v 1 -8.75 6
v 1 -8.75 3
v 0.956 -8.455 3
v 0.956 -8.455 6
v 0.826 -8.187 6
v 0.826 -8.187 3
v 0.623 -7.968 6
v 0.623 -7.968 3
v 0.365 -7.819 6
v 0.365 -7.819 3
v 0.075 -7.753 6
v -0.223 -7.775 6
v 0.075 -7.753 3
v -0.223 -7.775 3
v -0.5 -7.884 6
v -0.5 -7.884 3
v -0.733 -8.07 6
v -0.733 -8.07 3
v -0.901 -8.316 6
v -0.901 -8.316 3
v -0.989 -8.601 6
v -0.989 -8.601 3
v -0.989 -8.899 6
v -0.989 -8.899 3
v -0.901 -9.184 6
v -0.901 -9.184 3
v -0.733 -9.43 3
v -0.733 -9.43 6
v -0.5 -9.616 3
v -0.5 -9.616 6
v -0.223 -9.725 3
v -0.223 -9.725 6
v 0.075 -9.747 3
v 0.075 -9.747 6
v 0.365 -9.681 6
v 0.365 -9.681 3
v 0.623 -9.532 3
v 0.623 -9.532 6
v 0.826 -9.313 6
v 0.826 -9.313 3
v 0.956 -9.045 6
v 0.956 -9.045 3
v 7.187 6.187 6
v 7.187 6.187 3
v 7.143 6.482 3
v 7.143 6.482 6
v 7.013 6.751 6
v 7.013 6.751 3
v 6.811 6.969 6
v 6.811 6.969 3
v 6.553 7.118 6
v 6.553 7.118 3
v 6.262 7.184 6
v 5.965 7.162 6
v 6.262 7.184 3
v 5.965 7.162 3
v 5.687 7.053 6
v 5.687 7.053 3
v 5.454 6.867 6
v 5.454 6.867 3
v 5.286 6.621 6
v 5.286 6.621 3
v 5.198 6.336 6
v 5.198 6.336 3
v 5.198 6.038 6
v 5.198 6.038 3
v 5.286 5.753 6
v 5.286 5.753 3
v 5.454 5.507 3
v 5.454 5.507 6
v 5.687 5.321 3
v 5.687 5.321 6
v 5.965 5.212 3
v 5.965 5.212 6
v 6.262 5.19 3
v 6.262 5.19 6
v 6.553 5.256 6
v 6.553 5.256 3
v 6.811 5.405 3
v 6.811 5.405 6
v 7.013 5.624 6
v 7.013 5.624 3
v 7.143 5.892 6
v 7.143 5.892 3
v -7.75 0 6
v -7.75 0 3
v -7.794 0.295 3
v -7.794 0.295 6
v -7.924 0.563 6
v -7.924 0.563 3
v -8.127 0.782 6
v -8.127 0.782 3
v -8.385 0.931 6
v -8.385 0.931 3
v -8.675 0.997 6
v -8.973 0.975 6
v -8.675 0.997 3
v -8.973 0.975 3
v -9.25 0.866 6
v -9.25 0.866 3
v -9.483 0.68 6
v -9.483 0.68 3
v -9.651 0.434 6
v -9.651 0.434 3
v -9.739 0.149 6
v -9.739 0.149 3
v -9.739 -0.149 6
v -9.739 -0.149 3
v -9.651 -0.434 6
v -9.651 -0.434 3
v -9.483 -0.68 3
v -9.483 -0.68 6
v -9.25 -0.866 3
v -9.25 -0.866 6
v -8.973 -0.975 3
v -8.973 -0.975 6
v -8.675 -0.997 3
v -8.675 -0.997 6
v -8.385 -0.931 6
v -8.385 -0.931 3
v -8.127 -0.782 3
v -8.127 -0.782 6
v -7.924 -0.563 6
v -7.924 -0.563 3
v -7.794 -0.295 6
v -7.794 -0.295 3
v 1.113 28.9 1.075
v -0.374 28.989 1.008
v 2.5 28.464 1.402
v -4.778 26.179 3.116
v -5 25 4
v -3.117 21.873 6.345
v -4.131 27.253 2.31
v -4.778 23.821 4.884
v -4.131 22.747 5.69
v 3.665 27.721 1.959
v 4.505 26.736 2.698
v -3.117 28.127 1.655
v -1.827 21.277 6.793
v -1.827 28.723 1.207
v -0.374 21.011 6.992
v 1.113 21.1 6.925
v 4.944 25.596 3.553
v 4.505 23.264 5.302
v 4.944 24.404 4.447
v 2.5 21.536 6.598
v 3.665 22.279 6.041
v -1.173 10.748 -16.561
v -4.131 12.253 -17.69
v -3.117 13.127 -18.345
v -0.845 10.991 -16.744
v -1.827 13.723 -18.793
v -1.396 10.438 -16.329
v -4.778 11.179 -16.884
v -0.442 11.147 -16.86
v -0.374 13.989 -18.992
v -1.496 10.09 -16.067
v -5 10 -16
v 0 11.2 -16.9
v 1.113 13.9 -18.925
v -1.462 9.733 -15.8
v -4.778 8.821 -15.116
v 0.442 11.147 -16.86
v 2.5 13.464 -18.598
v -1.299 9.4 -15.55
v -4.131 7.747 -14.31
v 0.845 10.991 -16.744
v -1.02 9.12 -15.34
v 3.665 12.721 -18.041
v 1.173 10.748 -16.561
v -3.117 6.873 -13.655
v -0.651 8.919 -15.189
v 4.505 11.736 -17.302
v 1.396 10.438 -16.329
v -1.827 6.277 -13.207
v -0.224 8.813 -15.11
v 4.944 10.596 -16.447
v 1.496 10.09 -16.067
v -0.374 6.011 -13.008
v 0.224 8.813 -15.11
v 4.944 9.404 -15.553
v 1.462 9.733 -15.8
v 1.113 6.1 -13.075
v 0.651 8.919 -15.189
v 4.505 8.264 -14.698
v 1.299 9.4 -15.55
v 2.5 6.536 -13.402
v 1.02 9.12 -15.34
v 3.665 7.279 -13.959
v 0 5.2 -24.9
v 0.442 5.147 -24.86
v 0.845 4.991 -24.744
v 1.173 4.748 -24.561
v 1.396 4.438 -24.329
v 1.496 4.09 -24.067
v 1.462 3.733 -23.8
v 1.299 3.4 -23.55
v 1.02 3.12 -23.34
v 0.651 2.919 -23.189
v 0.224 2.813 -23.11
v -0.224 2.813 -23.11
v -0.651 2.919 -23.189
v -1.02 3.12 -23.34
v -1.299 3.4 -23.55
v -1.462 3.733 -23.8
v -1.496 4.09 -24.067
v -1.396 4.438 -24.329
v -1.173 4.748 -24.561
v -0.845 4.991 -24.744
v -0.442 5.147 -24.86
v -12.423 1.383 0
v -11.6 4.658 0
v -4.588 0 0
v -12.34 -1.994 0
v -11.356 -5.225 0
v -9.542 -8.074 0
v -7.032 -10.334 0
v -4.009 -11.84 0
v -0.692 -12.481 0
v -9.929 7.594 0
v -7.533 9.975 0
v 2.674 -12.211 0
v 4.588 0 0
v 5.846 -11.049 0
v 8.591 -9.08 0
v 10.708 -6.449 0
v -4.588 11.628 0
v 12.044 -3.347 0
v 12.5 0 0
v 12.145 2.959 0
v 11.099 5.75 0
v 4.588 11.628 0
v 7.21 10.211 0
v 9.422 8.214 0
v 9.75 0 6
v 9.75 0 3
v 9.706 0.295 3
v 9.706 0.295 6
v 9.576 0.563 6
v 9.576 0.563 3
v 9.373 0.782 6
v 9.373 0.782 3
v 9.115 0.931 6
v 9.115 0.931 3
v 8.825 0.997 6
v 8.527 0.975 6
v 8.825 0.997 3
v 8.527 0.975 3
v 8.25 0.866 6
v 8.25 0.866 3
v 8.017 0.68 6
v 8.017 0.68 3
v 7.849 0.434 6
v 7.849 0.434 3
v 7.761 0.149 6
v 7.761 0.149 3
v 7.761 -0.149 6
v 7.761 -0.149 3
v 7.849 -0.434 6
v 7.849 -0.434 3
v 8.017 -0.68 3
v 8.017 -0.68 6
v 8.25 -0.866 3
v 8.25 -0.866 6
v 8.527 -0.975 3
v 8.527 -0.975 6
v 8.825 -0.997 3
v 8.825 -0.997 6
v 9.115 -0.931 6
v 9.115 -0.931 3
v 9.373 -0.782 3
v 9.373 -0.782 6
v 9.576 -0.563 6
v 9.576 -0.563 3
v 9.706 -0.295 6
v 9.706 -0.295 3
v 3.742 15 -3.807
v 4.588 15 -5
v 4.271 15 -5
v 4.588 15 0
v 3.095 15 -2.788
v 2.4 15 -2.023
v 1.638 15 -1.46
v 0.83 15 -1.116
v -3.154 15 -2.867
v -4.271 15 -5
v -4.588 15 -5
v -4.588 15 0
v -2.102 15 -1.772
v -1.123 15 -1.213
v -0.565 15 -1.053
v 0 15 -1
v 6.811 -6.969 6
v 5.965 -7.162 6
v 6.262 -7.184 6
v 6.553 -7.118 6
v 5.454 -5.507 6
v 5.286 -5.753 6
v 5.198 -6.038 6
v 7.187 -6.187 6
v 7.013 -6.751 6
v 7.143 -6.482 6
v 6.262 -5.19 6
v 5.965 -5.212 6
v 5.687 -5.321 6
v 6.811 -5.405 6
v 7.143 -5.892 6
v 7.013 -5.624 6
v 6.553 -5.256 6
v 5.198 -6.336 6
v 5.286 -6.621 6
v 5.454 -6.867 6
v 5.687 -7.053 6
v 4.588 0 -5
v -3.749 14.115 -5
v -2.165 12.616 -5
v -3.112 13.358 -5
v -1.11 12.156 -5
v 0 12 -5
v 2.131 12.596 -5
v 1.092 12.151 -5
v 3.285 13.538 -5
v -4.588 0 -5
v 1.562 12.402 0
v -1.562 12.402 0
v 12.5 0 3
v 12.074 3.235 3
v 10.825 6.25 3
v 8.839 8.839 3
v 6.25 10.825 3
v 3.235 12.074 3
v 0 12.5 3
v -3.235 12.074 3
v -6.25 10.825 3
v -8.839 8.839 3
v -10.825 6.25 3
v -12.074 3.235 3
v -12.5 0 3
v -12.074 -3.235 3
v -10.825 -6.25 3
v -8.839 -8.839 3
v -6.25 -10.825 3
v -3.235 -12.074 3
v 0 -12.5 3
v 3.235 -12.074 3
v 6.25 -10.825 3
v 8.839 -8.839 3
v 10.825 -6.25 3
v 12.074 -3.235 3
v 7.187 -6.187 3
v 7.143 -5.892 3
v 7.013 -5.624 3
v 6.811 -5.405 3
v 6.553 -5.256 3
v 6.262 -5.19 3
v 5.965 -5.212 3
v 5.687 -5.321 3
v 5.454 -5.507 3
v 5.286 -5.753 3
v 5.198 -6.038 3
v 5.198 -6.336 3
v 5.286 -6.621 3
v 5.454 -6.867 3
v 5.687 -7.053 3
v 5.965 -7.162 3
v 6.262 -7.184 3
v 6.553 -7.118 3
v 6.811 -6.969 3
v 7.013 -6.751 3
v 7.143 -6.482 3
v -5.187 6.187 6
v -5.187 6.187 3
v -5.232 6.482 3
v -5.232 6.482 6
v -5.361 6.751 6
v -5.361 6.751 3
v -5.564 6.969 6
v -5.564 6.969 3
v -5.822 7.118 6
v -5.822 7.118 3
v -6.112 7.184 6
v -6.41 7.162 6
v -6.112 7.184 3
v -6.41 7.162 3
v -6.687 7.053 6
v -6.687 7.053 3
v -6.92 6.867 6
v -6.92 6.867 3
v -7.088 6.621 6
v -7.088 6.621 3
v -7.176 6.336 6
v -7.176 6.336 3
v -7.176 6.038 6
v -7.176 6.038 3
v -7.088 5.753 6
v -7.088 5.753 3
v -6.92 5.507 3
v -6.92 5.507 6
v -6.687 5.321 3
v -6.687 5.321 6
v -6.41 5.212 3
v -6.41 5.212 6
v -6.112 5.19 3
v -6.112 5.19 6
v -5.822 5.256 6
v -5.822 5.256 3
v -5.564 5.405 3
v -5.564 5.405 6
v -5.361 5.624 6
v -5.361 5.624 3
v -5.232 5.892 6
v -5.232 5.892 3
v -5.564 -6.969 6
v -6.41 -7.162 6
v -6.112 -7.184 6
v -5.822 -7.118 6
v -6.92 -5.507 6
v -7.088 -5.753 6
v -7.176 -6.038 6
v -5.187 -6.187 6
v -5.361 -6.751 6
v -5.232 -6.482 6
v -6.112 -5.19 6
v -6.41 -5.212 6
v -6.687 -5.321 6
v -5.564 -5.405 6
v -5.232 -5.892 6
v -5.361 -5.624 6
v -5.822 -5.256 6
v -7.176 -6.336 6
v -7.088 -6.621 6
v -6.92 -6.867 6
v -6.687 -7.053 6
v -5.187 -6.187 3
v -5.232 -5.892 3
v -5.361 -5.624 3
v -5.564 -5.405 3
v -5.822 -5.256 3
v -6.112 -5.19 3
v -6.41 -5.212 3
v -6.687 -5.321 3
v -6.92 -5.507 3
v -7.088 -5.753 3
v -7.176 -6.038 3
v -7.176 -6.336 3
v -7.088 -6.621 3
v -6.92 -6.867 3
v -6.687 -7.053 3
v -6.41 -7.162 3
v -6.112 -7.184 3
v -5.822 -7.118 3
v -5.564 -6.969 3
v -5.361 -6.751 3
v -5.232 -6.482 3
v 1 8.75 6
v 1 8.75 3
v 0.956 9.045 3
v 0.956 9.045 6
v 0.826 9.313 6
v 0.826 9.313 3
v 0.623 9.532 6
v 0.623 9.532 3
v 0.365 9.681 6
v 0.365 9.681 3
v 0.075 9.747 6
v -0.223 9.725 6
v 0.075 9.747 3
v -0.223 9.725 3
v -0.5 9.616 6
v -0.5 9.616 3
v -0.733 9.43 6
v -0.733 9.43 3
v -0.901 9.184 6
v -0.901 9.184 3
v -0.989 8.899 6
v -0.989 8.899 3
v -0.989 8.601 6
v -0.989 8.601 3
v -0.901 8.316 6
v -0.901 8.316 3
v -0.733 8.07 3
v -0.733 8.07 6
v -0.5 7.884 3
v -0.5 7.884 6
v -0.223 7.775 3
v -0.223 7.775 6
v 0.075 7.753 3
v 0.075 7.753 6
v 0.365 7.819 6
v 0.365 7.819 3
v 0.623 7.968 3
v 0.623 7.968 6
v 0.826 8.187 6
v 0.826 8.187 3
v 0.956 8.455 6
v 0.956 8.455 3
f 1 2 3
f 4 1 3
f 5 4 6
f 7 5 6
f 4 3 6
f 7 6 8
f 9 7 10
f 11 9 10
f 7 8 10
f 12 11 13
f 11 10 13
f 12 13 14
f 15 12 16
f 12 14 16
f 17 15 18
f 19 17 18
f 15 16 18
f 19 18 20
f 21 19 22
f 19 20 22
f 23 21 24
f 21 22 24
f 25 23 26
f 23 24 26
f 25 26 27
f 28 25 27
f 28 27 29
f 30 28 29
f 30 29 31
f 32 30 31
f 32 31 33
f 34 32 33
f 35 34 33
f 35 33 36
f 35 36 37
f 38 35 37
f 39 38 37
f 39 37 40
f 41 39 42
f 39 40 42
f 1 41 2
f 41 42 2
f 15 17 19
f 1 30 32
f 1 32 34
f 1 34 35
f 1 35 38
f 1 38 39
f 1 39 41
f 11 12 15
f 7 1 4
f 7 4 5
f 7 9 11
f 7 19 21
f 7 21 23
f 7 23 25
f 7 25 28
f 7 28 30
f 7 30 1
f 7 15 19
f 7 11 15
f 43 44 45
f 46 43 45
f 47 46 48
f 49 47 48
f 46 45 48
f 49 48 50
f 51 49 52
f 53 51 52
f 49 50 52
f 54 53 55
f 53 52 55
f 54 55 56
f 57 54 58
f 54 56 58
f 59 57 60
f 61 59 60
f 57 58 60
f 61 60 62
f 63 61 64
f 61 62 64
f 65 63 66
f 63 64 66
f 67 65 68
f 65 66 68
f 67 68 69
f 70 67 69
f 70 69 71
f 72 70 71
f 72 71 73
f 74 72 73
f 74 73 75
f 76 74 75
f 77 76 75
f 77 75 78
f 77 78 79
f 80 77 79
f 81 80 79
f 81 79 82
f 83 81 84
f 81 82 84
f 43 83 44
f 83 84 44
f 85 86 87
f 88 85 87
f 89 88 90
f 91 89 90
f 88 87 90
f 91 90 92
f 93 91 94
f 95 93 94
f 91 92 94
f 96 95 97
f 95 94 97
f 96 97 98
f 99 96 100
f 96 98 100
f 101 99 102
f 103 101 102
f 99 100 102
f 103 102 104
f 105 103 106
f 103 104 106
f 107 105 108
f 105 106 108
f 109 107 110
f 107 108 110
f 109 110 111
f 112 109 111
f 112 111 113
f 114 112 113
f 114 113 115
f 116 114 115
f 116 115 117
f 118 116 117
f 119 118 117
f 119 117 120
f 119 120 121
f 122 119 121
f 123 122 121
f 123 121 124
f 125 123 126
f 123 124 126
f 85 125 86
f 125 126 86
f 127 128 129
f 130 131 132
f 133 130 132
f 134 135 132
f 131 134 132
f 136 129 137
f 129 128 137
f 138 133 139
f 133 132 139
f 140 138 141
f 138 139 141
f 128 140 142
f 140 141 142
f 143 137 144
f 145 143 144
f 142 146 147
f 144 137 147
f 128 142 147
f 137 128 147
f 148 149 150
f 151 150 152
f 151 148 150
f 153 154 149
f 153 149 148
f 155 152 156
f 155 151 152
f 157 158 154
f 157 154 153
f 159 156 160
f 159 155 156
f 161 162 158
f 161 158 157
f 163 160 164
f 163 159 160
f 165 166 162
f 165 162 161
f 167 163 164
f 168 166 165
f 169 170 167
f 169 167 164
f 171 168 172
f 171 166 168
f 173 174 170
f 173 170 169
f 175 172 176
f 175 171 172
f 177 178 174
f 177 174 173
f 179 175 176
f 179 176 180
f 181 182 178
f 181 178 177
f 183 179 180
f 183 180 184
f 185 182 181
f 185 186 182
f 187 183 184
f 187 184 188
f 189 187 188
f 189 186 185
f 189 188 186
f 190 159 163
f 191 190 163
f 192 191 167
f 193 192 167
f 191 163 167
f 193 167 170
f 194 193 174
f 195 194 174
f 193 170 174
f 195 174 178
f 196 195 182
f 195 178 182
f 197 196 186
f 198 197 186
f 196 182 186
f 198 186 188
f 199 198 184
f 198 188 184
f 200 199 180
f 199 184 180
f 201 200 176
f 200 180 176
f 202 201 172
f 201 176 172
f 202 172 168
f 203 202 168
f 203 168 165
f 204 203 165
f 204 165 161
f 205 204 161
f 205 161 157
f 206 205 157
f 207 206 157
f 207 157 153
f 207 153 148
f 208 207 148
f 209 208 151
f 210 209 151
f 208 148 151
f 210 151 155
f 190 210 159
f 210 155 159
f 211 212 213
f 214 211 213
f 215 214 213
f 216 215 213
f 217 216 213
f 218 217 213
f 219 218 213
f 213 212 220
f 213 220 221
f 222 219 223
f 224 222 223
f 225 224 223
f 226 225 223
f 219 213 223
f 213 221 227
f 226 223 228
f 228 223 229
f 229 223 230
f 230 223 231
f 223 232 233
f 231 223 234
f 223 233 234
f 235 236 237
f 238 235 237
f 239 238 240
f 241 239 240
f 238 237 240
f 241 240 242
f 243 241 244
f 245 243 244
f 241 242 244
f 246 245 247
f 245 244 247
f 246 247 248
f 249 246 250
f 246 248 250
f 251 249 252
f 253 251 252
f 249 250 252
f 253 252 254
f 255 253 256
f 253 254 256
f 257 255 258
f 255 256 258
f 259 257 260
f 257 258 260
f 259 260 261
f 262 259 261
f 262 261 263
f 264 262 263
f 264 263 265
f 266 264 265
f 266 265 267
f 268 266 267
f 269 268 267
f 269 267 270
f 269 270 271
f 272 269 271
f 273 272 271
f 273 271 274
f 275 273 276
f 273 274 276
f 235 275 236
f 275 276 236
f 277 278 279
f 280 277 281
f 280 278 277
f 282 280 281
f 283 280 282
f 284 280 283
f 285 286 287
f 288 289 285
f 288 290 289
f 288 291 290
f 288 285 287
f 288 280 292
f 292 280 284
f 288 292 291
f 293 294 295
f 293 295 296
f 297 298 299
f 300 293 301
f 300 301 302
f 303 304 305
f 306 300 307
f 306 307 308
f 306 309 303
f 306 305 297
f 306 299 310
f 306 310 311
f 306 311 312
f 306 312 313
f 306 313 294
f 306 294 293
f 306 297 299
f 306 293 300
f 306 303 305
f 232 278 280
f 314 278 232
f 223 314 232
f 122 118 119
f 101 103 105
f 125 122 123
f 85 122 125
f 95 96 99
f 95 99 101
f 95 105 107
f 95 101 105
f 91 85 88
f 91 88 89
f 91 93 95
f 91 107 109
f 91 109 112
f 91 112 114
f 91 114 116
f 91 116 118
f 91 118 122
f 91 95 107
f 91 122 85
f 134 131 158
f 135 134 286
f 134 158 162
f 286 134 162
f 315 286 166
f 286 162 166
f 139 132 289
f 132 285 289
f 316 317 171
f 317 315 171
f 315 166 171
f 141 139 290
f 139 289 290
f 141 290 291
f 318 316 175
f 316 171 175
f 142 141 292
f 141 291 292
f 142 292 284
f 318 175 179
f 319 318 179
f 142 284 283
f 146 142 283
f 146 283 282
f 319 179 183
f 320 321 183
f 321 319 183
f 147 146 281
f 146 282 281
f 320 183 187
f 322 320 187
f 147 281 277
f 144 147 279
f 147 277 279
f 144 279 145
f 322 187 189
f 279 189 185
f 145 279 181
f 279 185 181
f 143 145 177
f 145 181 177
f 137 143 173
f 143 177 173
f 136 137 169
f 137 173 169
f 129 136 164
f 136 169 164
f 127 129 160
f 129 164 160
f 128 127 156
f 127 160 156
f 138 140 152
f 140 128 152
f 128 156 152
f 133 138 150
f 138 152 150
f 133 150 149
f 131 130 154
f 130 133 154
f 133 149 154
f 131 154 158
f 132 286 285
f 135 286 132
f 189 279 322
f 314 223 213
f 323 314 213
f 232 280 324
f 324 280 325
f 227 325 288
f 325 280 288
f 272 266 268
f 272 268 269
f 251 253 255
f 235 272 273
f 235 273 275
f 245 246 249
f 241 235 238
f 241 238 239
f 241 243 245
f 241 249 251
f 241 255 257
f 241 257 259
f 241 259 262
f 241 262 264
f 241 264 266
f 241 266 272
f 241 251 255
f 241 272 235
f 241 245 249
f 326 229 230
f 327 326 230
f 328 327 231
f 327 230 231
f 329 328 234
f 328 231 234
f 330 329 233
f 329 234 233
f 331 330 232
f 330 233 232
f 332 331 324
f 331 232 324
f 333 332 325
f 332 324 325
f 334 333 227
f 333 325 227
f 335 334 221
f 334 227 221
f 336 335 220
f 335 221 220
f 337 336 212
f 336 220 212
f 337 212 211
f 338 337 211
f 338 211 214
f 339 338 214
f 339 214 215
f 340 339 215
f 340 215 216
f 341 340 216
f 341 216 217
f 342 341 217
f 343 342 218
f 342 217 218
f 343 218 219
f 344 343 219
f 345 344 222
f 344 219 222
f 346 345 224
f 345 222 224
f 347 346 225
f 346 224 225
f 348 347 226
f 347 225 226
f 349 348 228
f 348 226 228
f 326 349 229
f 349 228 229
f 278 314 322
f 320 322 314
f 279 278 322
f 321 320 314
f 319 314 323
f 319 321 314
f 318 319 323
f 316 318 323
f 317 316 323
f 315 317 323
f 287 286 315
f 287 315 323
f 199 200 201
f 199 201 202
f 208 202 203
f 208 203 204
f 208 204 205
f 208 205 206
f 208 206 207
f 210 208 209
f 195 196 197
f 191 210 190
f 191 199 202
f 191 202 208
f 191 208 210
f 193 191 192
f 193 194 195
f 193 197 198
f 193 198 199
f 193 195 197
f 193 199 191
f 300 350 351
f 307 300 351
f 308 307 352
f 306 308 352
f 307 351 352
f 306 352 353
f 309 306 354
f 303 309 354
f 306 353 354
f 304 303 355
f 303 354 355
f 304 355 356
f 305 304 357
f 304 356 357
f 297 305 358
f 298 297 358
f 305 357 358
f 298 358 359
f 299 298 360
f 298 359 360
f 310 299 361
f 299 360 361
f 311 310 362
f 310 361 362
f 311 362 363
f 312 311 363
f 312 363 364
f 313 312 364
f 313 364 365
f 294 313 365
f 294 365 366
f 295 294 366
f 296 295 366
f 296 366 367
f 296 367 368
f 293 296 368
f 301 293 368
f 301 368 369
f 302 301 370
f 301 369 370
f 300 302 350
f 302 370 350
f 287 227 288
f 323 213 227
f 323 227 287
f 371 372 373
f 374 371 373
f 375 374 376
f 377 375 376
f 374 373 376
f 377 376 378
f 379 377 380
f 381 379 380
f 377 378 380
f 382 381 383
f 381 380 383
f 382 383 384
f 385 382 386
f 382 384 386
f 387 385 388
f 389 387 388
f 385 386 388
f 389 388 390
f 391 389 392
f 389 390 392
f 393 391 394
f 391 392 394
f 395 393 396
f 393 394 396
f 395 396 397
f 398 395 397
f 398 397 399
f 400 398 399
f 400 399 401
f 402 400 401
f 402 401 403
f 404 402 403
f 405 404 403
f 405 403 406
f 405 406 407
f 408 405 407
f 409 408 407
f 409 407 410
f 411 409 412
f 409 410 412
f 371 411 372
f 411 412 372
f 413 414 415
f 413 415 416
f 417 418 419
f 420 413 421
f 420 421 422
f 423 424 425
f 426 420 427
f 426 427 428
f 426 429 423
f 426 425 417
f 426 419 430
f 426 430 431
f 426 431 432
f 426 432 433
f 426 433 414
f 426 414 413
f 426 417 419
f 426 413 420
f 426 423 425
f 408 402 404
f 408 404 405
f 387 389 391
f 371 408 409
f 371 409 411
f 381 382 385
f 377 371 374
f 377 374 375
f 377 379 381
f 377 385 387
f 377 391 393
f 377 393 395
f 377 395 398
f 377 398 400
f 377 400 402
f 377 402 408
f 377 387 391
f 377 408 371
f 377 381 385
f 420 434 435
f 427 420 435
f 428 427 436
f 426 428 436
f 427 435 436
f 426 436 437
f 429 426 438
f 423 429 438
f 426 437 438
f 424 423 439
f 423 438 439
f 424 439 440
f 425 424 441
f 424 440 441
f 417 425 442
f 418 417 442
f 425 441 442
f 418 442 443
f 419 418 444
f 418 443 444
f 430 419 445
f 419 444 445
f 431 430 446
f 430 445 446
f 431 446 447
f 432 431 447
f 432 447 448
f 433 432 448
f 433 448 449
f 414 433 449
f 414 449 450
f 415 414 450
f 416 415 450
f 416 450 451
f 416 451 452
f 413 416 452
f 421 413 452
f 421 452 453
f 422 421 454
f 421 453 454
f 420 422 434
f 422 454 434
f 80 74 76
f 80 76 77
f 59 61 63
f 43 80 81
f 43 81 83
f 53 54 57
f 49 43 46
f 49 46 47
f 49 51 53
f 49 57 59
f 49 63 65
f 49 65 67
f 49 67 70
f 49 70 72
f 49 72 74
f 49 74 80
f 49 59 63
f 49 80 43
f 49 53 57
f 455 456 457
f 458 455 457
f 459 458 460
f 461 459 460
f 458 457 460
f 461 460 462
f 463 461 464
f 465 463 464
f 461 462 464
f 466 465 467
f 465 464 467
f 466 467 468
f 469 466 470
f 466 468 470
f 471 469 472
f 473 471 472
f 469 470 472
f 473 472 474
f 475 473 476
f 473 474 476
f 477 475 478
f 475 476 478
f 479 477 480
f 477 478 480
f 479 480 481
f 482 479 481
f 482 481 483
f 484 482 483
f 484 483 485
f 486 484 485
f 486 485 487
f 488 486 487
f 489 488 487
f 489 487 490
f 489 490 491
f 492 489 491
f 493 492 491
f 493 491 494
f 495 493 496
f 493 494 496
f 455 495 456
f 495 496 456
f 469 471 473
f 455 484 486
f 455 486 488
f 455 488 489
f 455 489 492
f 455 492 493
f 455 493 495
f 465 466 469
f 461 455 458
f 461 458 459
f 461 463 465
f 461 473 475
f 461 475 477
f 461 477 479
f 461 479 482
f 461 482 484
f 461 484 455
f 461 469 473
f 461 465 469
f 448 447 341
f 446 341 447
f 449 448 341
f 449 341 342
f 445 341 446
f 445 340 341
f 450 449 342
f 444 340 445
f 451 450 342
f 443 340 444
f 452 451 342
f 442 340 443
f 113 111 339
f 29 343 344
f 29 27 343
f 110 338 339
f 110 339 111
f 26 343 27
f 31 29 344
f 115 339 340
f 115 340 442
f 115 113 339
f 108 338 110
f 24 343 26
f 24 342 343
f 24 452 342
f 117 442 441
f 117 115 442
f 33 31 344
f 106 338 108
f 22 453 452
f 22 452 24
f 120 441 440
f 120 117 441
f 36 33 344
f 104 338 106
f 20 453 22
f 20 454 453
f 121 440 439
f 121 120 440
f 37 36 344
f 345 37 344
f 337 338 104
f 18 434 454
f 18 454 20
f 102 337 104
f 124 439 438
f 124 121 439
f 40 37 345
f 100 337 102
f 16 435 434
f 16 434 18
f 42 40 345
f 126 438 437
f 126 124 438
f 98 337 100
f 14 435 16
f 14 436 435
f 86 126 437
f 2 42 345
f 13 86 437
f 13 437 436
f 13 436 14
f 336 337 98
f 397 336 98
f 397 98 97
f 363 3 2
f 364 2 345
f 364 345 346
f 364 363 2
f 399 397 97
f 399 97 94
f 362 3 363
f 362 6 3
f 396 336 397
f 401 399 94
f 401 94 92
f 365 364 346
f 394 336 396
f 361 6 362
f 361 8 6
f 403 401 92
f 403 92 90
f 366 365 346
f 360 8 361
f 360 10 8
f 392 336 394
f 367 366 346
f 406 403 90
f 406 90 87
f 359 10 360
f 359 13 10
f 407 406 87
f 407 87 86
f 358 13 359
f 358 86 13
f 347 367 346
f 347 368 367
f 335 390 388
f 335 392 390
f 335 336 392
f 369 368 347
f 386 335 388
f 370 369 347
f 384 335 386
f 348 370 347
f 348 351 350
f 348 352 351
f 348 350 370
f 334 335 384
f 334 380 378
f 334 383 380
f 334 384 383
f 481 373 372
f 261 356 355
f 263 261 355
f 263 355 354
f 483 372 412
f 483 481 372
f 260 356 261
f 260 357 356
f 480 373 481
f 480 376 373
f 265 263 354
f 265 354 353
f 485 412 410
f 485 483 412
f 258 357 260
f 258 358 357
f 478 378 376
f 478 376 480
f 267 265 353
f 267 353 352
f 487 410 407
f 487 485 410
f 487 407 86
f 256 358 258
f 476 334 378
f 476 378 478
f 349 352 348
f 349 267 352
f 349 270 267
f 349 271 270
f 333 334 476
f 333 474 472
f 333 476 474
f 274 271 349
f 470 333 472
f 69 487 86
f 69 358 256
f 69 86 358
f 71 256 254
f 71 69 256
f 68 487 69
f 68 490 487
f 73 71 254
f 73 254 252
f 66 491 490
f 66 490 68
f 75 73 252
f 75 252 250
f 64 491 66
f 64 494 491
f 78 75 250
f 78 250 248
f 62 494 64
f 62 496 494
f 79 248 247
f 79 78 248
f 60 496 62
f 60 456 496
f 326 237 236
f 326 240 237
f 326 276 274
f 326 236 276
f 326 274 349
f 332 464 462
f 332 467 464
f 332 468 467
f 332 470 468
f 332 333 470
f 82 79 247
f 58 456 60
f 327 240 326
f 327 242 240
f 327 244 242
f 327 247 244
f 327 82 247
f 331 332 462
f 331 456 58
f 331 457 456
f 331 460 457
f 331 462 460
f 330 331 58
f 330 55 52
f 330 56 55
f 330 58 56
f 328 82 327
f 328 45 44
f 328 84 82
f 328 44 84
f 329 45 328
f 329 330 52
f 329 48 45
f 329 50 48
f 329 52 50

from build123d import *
from build123d.topology import SkipClean

# Parameters (mm, degrees)
SKIZZE2_R                       = 12.5
AUFSATZ_LINEAR_AUSTRAGEN1_DEPTH = 3
SKIZZE3_R                       = 1
AUFSATZ_LINEAR_AUSTRAGEN2_DEPTH = 3
SKIZZE4_W                       = 9.175781616
SKIZZE4_H                       = 15
AUFSATZ_LINEAR_AUSTRAGEN3_DEPTH = 5
SCHNITT_LINEAR_AUSTRAGEN1_DEPTH = 10
SKIZZE6_W                       = 10
SKIZZE6_H                       = 25
AUFSATZ_LINEAR_AUSTRAGEN4_DEPTH = 10
VERRUNDUNG1_R                   = 5
SKIZZE7_R                       = 1.5
AUFSATZ_LINEAR_AUSTRAGEN5_DEPTH = 10


with BuildPart() as part:
    # Skizze2 → Aufsatz-Linear austragen1 (new body)
    with BuildSketch(Plane.XY):
        Circle(SKIZZE2_R)
    extrude(amount=AUFSATZ_LINEAR_AUSTRAGEN1_DEPTH)

    # Skizze3 → Aufsatz-Linear austragen2 (add)
    with BuildSketch(Plane.XY.offset(3)):
        with Locations((0, 8.75)):
            Circle(SKIZZE3_R)
        with Locations((6.187184335, 6.187184335)):
            Circle(SKIZZE3_R)
        with Locations((8.75, 0)):
            Circle(SKIZZE3_R)
        with Locations((6.187184335, -6.187184335)):
            Circle(SKIZZE3_R)
        with Locations((0, -8.75)):
            Circle(SKIZZE3_R)
        with Locations((-6.187184335, -6.187184335)):
            Circle(SKIZZE3_R)
        with Locations((-8.75, 0)):
            Circle(SKIZZE3_R)
        with Locations((-6.187184335, 6.187184335)):
            Circle(SKIZZE3_R)
    extrude(amount=AUFSATZ_LINEAR_AUSTRAGEN2_DEPTH)

    # Skizze4 → Aufsatz-Linear austragen3 (add)
    with BuildSketch(Plane(origin=(0, 0, 0), x_dir=(-1, 0, 0), z_dir=(0, 0, -1))):
        with Locations((0, 7.5)):
            Rectangle(SKIZZE4_W, SKIZZE4_H)
    extrude(amount=AUFSATZ_LINEAR_AUSTRAGEN3_DEPTH)

    # Skizze5 → Schnitt-Linear austragen1 (cut)
    with BuildSketch(Plane(origin=(4.587890808, 0, 0), x_dir=(0, 0, -1), z_dir=(1, 0, 0))):
        Polygon((1, 15), (5, 15), (5, 12), align=None)
    extrude(amount=-SCHNITT_LINEAR_AUSTRAGEN1_DEPTH, mode=Mode.SUBTRACT)

    # Skizze6 → Aufsatz-Linear austragen4 (add)
    with BuildSketch(Plane(origin=(0, 10.08, -7.56), x_dir=(1, 0, 0), z_dir=(0, 0.8, -0.6000000000000001))):
        with Locations((0, -5.7)):
            Rectangle(SKIZZE6_W, SKIZZE6_H)
    extrude(amount=AUFSATZ_LINEAR_AUSTRAGEN4_DEPTH)

    # Verrundung1
    # the kernel refuses this fillet: 5 mm, written as the material it takes off along each edge
    with BuildSketch(Plane(origin=(5, 28.5, 17), x_dir=(0, 0.8, -0.6), z_dir=(0, -0.6000000000000001, -0.8))) as verrundung1_piece_1_section:
        with BuildLine():
            CenterArc((VERRUNDUNG1_R, -VERRUNDUNG1_R), VERRUNDUNG1_R, 90, 90)
            Line((0, -VERRUNDUNG1_R), (0, 0))
            Line((0, 0), (VERRUNDUNG1_R, 0))
        make_face()
    verrundung1_piece_1 = extrude(amount=50, mode=Mode.PRIVATE)
    verrundung1_piece_1 = split(verrundung1_piece_1, bisect_by=Plane(origin=(4.587890808, 18.932165371, 1.027012133), z_dir=(1, 0, 0)), keep=Keep.TOP, mode=Mode.PRIVATE)
    add(verrundung1_piece_1, mode=Mode.SUBTRACT)
    with BuildSketch(Plane(origin=(5, 28.5, 17), x_dir=(0, 0.8, -0.6), z_dir=(0, -0.6000000000000001, -0.8))) as verrundung1_piece_2_section:
        with BuildLine():
            CenterArc((VERRUNDUNG1_R, -VERRUNDUNG1_R), VERRUNDUNG1_R, 90, 90)
            Line((0, -VERRUNDUNG1_R), (0, 0))
            Line((0, 0), (VERRUNDUNG1_R, 0))
        make_face()
    verrundung1_piece_2 = extrude(amount=50, mode=Mode.PRIVATE)
    verrundung1_piece_2 = split(verrundung1_piece_2, bisect_by=Plane(origin=(3.559847319, 15, 2.011430888), z_dir=(0, 1, 0)), keep=Keep.TOP, mode=Mode.PRIVATE)
    add(verrundung1_piece_2, mode=Mode.SUBTRACT)
    with BuildSketch(Plane(origin=(5, 28.5, 17), x_dir=(0, 0.8, -0.6), z_dir=(0, -0.6000000000000001, -0.8))) as verrundung1_piece_3_section:
        with BuildLine():
            CenterArc((VERRUNDUNG1_R, -VERRUNDUNG1_R), VERRUNDUNG1_R, 90, 90)
            Line((0, -VERRUNDUNG1_R), (0, 0))
            Line((0, 0), (VERRUNDUNG1_R, 0))
        make_face()
    verrundung1_piece_3 = extrude(amount=50, mode=Mode.PRIVATE)
    verrundung1_piece_3 = split(verrundung1_piece_3, bisect_by=Plane(origin=(3.543313448, 9.872718636, -5), z_dir=(0, 0, -1)), keep=Keep.TOP, mode=Mode.PRIVATE)
    add(verrundung1_piece_3, mode=Mode.SUBTRACT)
    with BuildSketch(Plane(origin=(-5, -1.5, -23), x_dir=(0, 0.7999999999999999, -0.6000000000000001), z_dir=(0, 0.6000000000000001, 0.8))) as verrundung1_piece_4_section:
        with BuildLine():
            CenterArc((VERRUNDUNG1_R, -VERRUNDUNG1_R), VERRUNDUNG1_R, 90, 90)
            Line((0, -VERRUNDUNG1_R), (0, 0))
            Line((0, 0), (VERRUNDUNG1_R, 0))
        make_face()
    verrundung1_piece_4 = extrude(amount=50, mode=Mode.PRIVATE)
    verrundung1_piece_4 = split(verrundung1_piece_4, bisect_by=Plane(origin=(-4.807563365, 10.769431466, -5), z_dir=(0, 0, -1)), keep=Keep.TOP, mode=Mode.PRIVATE)
    add(verrundung1_piece_4, mode=Mode.SUBTRACT)
    with BuildSketch(Plane(origin=(-5, -1.5, -23), x_dir=(0, 0.7999999999999999, -0.6000000000000001), z_dir=(0, 0.6000000000000001, 0.8))) as verrundung1_piece_5_section:
        with BuildLine():
            CenterArc((VERRUNDUNG1_R, -VERRUNDUNG1_R), VERRUNDUNG1_R, 90, 90)
            Line((0, -VERRUNDUNG1_R), (0, 0))
            Line((0, 0), (VERRUNDUNG1_R, 0))
        make_face()
    verrundung1_piece_5 = extrude(amount=50, mode=Mode.PRIVATE)
    verrundung1_piece_5 = split(verrundung1_piece_5, bisect_by=Plane(origin=(-4.587890808, 14, -3.666666667), z_dir=(-1, 0, 0)), keep=Keep.TOP, mode=Mode.PRIVATE)
    add(verrundung1_piece_5, mode=Mode.SUBTRACT)
    with BuildSketch(Plane(origin=(-5, -1.5, -23), x_dir=(0, 0.7999999999999999, -0.6000000000000001), z_dir=(0, 0.6000000000000001, 0.8))) as verrundung1_piece_6_section:
        with BuildLine():
            CenterArc((VERRUNDUNG1_R, -VERRUNDUNG1_R), VERRUNDUNG1_R, 90, 90)
            Line((0, -VERRUNDUNG1_R), (0, 0))
            Line((0, 0), (VERRUNDUNG1_R, 0))
        make_face()
    verrundung1_piece_6 = extrude(amount=50, mode=Mode.PRIVATE)
    verrundung1_piece_6 = split(verrundung1_piece_6, bisect_by=Plane(origin=(-3.559847319, 15, 2.011430888), z_dir=(0, 1, 0)), keep=Keep.TOP, mode=Mode.PRIVATE)
    add(verrundung1_piece_6, mode=Mode.SUBTRACT)
    with BuildSketch(Plane(origin=(-5, 6.5, -29), x_dir=(0, -0.8, 0.6), z_dir=(0, 0.6000000000000001, 0.8)), Plane(origin=(5, 36.5, 11), x_dir=(0, -0.8, 0.6), z_dir=(0, -0.6000000000000001, -0.8))) as verrundung1_piece_7:
        with BuildLine():
            CenterArc((VERRUNDUNG1_R, VERRUNDUNG1_R), VERRUNDUNG1_R, 180, 90)
            Line((0, VERRUNDUNG1_R), (0, 0))
            Line((0, 0), (VERRUNDUNG1_R, 0))
        make_face()
    extrude(amount=50, mode=Mode.SUBTRACT)

    # Skizze7 → Aufsatz-Linear austragen5 (add)
    with SkipClean():  # the faces are left unmerged after this step: merging them gives an invalid solid
        with BuildSketch(Plane(origin=(0, -4.08, -5.44), x_dir=(-1, 0, 0), z_dir=(0, -0.6000000000000002, -0.7999999999999999))):
            with Locations(Location((0, 17.6, 0), (0, 0, 90))):
                Circle(SKIZZE7_R)
        extrude(amount=AUFSATZ_LINEAR_AUSTRAGEN5_DEPTH)


solid = part.part
